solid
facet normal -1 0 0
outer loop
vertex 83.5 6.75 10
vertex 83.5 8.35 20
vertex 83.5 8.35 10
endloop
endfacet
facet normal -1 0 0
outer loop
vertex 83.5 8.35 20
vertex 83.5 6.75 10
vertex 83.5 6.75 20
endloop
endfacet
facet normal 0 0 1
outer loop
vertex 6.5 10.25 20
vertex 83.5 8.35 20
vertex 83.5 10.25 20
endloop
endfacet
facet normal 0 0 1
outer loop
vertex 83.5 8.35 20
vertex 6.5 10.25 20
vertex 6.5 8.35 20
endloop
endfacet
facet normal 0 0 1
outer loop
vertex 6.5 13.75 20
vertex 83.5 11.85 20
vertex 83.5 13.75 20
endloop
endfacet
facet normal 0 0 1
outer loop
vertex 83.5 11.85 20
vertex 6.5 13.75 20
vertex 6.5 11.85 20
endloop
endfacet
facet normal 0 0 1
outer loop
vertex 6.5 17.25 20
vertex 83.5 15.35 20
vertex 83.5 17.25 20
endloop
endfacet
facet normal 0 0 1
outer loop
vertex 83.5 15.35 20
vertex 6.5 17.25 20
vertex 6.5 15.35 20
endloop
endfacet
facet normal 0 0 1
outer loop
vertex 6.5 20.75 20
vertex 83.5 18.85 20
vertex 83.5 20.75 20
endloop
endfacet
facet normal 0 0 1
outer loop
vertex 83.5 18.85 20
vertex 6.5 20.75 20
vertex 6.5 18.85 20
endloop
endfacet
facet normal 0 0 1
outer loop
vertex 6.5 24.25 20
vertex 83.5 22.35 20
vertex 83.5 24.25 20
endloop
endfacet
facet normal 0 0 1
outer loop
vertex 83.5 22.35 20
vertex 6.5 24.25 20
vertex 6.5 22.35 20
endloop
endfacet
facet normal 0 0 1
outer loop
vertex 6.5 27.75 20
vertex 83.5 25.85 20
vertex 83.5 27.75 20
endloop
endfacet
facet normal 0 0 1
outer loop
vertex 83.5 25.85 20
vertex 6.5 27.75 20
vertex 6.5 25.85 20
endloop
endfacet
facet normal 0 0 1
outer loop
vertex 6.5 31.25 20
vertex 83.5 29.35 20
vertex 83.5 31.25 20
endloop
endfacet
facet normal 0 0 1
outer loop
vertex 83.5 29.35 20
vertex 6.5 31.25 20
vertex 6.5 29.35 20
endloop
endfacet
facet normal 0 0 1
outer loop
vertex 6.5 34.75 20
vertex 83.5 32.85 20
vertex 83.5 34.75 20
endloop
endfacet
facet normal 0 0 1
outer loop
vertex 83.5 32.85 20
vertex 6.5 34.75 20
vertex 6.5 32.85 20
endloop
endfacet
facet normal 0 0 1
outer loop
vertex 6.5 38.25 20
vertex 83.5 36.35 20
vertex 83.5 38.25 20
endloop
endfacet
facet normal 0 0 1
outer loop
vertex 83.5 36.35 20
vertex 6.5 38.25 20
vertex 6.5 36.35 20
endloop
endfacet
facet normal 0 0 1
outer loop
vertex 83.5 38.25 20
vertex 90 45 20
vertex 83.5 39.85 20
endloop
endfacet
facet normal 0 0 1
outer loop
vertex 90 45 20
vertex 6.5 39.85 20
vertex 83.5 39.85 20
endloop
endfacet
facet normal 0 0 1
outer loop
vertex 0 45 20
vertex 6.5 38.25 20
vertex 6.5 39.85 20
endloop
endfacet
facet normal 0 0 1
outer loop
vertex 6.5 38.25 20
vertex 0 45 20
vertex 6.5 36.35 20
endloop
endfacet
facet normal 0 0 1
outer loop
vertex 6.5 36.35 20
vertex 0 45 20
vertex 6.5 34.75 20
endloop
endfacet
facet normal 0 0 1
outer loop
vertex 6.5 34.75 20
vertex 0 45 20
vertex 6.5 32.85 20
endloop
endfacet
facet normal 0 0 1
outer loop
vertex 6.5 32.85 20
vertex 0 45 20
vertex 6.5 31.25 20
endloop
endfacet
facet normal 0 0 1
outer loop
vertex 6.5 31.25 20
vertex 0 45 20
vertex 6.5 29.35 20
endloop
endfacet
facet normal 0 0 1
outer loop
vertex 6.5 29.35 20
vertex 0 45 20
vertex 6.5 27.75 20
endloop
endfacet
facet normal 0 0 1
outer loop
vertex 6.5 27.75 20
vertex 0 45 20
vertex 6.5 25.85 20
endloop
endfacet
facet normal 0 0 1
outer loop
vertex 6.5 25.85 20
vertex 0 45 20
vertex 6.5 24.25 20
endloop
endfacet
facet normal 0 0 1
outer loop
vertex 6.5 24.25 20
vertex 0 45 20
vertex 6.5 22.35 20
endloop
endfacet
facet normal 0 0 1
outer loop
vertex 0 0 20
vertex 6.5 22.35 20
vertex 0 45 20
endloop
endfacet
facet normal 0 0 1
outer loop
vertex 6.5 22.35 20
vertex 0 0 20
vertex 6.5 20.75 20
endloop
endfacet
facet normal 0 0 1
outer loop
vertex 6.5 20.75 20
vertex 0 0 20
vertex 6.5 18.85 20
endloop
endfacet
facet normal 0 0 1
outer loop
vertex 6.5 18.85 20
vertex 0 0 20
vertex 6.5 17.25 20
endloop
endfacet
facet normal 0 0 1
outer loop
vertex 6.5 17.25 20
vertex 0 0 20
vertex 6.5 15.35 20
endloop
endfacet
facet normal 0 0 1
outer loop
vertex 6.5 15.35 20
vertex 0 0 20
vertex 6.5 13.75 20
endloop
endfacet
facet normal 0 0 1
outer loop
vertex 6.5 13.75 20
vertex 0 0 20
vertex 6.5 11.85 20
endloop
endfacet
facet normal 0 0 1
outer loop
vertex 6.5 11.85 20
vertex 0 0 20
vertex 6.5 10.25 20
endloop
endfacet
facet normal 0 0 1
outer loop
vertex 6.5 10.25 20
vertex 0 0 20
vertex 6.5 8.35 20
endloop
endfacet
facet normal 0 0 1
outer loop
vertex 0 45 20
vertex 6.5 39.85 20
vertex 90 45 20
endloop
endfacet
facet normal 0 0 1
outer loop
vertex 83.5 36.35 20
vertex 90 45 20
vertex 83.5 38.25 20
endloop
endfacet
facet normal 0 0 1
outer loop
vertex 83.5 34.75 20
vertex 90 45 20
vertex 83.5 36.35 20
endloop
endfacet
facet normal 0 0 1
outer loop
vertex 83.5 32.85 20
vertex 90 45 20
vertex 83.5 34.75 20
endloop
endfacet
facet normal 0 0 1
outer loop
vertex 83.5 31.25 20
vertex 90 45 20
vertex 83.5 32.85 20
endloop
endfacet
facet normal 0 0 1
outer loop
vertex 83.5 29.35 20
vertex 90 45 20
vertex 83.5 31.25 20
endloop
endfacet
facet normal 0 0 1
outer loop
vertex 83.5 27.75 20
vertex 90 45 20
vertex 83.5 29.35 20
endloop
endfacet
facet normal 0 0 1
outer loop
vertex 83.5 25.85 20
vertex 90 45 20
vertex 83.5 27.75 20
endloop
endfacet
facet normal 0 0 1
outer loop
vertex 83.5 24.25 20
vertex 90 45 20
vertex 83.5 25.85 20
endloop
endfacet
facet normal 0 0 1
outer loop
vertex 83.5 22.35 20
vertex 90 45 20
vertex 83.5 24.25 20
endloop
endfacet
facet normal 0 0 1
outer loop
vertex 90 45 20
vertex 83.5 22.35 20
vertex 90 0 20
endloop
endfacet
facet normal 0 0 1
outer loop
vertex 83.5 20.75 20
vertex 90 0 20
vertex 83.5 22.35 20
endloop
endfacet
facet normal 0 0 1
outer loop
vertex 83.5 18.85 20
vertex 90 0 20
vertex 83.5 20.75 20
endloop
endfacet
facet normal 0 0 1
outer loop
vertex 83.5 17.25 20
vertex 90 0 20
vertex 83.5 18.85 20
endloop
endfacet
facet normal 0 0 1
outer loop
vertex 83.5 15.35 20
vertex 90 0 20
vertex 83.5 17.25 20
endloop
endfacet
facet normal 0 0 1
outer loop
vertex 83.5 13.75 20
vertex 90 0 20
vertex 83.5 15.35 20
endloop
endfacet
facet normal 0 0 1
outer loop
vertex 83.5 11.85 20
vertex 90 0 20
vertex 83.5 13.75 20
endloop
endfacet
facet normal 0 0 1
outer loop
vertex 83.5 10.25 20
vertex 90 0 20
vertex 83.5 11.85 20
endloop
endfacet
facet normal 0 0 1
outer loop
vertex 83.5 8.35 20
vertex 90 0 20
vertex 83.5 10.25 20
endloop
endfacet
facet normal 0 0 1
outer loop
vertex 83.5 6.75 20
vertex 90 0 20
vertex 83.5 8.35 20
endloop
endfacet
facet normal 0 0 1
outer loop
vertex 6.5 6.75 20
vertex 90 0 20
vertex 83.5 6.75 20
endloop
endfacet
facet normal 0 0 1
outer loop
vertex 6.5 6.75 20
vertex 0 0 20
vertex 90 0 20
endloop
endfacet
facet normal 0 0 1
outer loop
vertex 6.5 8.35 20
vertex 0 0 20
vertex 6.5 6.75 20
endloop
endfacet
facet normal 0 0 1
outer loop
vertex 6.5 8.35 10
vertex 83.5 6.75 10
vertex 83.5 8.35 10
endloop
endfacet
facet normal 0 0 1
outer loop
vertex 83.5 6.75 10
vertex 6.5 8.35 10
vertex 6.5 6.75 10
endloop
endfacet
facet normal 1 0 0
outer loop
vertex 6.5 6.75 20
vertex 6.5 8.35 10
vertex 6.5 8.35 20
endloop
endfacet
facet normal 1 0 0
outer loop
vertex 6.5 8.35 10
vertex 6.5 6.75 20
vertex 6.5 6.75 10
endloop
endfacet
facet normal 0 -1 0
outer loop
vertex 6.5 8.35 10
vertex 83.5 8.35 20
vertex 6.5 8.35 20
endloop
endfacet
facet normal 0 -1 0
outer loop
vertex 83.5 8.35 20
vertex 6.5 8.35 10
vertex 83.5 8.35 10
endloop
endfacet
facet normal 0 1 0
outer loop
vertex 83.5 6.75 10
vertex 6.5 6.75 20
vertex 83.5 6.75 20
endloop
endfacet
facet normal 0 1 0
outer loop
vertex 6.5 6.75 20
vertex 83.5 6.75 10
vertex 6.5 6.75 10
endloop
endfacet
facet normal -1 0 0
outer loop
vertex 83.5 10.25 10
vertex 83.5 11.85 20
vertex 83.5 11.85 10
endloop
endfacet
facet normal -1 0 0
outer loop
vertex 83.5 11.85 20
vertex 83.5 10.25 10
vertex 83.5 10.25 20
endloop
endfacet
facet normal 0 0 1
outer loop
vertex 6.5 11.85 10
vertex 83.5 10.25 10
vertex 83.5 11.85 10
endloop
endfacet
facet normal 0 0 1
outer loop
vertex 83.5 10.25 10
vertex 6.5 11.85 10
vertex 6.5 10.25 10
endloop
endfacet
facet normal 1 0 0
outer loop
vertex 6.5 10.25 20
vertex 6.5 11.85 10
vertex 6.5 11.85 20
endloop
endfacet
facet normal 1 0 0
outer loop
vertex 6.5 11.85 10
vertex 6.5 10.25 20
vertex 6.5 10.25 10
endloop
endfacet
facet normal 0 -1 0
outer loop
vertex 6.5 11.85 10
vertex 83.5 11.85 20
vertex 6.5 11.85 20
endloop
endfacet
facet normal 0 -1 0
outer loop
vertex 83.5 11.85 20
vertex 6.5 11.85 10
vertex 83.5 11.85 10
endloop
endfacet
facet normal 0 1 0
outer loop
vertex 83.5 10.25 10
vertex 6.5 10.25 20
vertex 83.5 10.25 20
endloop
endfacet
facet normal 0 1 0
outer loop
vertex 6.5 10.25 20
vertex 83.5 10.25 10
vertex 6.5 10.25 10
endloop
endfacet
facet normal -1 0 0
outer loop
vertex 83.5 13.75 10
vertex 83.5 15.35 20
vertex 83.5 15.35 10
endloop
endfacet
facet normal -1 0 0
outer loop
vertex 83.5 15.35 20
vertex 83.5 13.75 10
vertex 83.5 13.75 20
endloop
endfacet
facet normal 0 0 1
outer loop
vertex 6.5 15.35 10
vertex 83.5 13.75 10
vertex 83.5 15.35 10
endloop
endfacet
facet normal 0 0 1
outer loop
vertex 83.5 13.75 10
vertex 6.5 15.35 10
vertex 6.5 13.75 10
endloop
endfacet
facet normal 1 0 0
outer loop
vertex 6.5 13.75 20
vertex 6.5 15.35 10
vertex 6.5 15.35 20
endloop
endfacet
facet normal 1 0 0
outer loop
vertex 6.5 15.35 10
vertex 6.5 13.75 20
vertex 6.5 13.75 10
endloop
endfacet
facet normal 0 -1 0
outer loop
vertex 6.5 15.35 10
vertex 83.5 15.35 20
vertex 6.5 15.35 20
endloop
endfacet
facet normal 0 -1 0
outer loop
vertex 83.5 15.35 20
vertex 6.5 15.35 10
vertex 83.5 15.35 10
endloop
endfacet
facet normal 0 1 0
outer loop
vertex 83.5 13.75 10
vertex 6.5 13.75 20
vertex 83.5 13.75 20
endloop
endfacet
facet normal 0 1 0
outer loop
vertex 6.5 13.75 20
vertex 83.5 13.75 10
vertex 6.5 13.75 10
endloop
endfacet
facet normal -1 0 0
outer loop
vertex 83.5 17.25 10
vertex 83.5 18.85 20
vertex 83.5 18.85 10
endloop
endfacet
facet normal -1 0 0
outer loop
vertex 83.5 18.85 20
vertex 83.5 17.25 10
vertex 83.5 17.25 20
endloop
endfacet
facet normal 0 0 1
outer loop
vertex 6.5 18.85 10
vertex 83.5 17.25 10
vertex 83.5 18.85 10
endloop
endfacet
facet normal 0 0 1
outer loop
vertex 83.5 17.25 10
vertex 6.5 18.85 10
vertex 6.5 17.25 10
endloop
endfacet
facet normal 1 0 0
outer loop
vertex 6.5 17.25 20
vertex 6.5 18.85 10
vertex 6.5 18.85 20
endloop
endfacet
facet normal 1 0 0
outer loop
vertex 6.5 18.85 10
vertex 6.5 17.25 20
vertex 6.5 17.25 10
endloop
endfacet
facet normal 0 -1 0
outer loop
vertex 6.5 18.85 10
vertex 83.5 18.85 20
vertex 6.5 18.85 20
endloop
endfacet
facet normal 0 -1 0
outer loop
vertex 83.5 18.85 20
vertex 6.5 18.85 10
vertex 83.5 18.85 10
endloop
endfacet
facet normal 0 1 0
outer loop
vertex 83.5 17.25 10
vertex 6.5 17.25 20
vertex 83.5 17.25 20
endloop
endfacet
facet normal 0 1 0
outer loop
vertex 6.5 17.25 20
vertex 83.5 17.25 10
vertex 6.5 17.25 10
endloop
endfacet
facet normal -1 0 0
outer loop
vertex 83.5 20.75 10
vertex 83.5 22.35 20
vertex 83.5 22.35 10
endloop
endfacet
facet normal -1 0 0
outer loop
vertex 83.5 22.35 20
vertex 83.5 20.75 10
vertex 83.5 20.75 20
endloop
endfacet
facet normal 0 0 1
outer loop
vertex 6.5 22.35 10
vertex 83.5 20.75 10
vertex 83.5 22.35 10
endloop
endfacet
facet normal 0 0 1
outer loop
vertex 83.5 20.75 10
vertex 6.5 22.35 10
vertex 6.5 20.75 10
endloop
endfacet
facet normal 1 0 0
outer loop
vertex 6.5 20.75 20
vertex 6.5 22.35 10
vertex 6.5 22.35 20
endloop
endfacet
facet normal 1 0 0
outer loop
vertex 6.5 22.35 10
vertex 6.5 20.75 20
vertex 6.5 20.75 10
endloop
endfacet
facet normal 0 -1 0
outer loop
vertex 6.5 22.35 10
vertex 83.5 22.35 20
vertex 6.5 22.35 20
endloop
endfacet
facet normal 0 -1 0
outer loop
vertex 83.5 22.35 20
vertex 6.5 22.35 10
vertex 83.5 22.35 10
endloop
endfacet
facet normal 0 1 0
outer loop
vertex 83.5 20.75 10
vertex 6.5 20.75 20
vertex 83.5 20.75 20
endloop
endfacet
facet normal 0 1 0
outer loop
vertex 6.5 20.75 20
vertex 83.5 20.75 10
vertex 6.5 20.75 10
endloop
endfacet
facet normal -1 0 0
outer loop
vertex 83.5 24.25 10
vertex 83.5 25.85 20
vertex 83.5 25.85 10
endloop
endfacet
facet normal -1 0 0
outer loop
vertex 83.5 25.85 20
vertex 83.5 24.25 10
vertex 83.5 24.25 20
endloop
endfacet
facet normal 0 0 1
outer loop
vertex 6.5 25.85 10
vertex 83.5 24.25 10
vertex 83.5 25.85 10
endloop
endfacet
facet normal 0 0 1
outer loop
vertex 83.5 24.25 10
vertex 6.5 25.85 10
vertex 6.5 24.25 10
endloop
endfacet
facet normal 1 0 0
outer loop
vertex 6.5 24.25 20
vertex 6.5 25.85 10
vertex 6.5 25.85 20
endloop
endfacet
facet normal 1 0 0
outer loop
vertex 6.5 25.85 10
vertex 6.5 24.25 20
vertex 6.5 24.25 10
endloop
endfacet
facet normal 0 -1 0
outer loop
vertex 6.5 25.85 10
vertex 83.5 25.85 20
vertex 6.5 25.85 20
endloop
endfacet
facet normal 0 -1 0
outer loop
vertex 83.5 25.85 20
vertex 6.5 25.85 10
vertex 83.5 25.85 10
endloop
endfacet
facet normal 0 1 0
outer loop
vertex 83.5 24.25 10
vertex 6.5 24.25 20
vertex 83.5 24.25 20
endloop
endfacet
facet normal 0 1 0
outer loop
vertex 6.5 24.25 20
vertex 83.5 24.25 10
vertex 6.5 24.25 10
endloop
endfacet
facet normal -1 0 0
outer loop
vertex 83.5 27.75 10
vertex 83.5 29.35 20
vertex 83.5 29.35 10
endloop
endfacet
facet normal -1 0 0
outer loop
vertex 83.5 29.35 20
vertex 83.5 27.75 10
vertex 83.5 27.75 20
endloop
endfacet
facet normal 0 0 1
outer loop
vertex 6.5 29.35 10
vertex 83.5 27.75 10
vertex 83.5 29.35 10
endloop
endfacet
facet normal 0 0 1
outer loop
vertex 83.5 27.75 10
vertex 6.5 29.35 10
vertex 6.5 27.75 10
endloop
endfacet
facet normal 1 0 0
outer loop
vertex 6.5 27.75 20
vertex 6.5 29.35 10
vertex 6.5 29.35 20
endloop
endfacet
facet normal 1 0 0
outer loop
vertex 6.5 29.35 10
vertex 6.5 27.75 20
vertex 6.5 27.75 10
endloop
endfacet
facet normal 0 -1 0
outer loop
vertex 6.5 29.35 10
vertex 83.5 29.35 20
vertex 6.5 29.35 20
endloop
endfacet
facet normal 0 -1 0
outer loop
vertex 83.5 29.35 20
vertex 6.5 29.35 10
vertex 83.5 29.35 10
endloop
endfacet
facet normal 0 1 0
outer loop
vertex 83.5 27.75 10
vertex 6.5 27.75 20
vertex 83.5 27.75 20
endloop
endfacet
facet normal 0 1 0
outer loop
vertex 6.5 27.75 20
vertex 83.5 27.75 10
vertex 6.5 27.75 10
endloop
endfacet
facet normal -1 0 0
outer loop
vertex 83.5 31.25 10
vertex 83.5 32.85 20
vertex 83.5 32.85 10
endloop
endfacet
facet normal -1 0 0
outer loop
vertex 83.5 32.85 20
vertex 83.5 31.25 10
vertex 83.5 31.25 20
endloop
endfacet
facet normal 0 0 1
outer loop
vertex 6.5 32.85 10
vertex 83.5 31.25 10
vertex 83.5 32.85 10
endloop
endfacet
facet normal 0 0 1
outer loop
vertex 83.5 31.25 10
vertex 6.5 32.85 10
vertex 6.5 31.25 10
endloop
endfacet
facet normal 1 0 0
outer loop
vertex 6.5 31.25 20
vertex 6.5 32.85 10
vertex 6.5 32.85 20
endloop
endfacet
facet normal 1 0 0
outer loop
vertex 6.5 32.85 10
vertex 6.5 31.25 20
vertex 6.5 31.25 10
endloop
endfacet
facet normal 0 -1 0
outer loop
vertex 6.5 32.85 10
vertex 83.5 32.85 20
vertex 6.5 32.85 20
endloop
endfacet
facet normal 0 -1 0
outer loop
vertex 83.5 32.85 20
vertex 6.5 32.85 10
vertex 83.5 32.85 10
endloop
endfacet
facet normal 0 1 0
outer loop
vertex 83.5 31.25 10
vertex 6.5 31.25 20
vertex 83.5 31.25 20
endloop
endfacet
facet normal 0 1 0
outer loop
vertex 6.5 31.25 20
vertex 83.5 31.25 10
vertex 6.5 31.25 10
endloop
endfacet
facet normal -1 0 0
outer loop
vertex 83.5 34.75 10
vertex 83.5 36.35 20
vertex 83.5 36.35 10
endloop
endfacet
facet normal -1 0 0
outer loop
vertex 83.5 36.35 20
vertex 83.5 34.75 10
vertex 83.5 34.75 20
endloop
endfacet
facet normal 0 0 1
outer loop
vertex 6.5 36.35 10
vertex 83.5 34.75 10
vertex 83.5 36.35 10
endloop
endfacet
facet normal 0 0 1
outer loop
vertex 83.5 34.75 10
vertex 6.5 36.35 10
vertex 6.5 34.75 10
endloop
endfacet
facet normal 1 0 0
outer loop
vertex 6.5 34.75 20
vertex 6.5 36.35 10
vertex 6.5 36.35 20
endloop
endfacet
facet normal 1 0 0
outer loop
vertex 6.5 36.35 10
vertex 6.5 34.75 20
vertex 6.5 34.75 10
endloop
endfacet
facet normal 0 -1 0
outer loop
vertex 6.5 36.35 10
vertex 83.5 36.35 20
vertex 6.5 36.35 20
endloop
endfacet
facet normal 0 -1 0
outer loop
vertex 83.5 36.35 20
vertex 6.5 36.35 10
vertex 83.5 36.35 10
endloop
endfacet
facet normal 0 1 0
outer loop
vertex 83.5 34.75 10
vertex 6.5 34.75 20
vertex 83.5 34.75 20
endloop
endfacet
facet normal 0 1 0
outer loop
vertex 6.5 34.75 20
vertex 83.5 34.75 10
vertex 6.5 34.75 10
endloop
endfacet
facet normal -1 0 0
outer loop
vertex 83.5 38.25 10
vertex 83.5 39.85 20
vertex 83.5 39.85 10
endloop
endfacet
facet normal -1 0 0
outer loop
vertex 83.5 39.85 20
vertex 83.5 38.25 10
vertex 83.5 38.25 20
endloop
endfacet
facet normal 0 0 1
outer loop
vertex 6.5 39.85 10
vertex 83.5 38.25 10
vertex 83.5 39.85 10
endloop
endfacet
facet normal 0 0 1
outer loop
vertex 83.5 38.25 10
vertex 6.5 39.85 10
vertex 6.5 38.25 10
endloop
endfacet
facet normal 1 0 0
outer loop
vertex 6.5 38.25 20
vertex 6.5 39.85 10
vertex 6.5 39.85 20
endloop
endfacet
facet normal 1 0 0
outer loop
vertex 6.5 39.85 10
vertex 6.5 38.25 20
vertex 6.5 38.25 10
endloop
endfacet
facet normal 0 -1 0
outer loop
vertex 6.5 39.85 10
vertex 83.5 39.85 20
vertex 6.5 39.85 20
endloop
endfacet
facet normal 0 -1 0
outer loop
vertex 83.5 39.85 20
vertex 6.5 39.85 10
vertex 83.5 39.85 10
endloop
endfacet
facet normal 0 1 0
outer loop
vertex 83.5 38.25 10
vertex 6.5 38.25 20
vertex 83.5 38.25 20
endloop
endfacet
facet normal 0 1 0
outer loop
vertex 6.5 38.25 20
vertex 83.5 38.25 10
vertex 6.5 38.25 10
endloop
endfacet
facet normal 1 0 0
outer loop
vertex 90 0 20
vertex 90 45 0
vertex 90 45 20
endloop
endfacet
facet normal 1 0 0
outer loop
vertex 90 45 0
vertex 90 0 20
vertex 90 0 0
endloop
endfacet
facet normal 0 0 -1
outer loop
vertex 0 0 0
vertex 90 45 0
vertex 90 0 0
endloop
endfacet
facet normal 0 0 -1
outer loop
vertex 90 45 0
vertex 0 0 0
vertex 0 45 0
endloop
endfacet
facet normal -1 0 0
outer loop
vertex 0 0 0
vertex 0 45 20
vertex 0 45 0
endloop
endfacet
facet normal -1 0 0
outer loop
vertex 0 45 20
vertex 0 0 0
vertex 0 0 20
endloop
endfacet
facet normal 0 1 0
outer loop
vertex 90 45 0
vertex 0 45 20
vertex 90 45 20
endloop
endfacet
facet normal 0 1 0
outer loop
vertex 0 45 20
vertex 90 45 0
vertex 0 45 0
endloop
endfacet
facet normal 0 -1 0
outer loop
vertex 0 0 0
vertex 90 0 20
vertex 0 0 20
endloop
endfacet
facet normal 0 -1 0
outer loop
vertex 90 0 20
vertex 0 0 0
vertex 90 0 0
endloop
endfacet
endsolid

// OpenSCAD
// Microscope slide drying rack - solid base with 10 parallel slots for standing slides.

// Base dimensions
L_base = 90;
W_base = 45;
H_base = 20;

// Slide dimensions
slide_w = 25;
slide_h = 75;
slide_t = 1;

// Slot dimensions
slot_len = 77;
slot_w   = 1.6;
slot_d   = 10;

// Spacing and positioning
slot_c2c = 3.5;
n_slots  = 10;

// Derived positions
// Slots are centred in Y on the block
y_offset = (W_base - (n_slots - 1) * slot_c2c) / 2;

// Slots are centred in X on the block
x_offset = (L_base - slot_len) / 2;

$fn = 64;

difference() {
    // Main solid block
    translate([0, 0, 0]) cube([L_base, W_base, H_base]);

    // Cut 10 slots running along X
    // Slots are 10mm deep and open at the top, so they are cut from the top face (z=20) down to z=10.
    for (i = [0 : n_slots - 1]) {
        // Calculate Y position for this slot
        y_pos = y_offset + i * slot_c2c;
        
        // Slot geometry: runs along X, width in Y, depth in Z
        // Position Z at the top of the block (H_base)
        translate([x_offset, y_pos, H_base - slot_d]) {
            // Cut a rectangular prism for the slot
            // Length = slot_len, Width = slot_w, Depth = slot_d
            cube([slot_len, slot_w, slot_d]);
        }
    }
}
